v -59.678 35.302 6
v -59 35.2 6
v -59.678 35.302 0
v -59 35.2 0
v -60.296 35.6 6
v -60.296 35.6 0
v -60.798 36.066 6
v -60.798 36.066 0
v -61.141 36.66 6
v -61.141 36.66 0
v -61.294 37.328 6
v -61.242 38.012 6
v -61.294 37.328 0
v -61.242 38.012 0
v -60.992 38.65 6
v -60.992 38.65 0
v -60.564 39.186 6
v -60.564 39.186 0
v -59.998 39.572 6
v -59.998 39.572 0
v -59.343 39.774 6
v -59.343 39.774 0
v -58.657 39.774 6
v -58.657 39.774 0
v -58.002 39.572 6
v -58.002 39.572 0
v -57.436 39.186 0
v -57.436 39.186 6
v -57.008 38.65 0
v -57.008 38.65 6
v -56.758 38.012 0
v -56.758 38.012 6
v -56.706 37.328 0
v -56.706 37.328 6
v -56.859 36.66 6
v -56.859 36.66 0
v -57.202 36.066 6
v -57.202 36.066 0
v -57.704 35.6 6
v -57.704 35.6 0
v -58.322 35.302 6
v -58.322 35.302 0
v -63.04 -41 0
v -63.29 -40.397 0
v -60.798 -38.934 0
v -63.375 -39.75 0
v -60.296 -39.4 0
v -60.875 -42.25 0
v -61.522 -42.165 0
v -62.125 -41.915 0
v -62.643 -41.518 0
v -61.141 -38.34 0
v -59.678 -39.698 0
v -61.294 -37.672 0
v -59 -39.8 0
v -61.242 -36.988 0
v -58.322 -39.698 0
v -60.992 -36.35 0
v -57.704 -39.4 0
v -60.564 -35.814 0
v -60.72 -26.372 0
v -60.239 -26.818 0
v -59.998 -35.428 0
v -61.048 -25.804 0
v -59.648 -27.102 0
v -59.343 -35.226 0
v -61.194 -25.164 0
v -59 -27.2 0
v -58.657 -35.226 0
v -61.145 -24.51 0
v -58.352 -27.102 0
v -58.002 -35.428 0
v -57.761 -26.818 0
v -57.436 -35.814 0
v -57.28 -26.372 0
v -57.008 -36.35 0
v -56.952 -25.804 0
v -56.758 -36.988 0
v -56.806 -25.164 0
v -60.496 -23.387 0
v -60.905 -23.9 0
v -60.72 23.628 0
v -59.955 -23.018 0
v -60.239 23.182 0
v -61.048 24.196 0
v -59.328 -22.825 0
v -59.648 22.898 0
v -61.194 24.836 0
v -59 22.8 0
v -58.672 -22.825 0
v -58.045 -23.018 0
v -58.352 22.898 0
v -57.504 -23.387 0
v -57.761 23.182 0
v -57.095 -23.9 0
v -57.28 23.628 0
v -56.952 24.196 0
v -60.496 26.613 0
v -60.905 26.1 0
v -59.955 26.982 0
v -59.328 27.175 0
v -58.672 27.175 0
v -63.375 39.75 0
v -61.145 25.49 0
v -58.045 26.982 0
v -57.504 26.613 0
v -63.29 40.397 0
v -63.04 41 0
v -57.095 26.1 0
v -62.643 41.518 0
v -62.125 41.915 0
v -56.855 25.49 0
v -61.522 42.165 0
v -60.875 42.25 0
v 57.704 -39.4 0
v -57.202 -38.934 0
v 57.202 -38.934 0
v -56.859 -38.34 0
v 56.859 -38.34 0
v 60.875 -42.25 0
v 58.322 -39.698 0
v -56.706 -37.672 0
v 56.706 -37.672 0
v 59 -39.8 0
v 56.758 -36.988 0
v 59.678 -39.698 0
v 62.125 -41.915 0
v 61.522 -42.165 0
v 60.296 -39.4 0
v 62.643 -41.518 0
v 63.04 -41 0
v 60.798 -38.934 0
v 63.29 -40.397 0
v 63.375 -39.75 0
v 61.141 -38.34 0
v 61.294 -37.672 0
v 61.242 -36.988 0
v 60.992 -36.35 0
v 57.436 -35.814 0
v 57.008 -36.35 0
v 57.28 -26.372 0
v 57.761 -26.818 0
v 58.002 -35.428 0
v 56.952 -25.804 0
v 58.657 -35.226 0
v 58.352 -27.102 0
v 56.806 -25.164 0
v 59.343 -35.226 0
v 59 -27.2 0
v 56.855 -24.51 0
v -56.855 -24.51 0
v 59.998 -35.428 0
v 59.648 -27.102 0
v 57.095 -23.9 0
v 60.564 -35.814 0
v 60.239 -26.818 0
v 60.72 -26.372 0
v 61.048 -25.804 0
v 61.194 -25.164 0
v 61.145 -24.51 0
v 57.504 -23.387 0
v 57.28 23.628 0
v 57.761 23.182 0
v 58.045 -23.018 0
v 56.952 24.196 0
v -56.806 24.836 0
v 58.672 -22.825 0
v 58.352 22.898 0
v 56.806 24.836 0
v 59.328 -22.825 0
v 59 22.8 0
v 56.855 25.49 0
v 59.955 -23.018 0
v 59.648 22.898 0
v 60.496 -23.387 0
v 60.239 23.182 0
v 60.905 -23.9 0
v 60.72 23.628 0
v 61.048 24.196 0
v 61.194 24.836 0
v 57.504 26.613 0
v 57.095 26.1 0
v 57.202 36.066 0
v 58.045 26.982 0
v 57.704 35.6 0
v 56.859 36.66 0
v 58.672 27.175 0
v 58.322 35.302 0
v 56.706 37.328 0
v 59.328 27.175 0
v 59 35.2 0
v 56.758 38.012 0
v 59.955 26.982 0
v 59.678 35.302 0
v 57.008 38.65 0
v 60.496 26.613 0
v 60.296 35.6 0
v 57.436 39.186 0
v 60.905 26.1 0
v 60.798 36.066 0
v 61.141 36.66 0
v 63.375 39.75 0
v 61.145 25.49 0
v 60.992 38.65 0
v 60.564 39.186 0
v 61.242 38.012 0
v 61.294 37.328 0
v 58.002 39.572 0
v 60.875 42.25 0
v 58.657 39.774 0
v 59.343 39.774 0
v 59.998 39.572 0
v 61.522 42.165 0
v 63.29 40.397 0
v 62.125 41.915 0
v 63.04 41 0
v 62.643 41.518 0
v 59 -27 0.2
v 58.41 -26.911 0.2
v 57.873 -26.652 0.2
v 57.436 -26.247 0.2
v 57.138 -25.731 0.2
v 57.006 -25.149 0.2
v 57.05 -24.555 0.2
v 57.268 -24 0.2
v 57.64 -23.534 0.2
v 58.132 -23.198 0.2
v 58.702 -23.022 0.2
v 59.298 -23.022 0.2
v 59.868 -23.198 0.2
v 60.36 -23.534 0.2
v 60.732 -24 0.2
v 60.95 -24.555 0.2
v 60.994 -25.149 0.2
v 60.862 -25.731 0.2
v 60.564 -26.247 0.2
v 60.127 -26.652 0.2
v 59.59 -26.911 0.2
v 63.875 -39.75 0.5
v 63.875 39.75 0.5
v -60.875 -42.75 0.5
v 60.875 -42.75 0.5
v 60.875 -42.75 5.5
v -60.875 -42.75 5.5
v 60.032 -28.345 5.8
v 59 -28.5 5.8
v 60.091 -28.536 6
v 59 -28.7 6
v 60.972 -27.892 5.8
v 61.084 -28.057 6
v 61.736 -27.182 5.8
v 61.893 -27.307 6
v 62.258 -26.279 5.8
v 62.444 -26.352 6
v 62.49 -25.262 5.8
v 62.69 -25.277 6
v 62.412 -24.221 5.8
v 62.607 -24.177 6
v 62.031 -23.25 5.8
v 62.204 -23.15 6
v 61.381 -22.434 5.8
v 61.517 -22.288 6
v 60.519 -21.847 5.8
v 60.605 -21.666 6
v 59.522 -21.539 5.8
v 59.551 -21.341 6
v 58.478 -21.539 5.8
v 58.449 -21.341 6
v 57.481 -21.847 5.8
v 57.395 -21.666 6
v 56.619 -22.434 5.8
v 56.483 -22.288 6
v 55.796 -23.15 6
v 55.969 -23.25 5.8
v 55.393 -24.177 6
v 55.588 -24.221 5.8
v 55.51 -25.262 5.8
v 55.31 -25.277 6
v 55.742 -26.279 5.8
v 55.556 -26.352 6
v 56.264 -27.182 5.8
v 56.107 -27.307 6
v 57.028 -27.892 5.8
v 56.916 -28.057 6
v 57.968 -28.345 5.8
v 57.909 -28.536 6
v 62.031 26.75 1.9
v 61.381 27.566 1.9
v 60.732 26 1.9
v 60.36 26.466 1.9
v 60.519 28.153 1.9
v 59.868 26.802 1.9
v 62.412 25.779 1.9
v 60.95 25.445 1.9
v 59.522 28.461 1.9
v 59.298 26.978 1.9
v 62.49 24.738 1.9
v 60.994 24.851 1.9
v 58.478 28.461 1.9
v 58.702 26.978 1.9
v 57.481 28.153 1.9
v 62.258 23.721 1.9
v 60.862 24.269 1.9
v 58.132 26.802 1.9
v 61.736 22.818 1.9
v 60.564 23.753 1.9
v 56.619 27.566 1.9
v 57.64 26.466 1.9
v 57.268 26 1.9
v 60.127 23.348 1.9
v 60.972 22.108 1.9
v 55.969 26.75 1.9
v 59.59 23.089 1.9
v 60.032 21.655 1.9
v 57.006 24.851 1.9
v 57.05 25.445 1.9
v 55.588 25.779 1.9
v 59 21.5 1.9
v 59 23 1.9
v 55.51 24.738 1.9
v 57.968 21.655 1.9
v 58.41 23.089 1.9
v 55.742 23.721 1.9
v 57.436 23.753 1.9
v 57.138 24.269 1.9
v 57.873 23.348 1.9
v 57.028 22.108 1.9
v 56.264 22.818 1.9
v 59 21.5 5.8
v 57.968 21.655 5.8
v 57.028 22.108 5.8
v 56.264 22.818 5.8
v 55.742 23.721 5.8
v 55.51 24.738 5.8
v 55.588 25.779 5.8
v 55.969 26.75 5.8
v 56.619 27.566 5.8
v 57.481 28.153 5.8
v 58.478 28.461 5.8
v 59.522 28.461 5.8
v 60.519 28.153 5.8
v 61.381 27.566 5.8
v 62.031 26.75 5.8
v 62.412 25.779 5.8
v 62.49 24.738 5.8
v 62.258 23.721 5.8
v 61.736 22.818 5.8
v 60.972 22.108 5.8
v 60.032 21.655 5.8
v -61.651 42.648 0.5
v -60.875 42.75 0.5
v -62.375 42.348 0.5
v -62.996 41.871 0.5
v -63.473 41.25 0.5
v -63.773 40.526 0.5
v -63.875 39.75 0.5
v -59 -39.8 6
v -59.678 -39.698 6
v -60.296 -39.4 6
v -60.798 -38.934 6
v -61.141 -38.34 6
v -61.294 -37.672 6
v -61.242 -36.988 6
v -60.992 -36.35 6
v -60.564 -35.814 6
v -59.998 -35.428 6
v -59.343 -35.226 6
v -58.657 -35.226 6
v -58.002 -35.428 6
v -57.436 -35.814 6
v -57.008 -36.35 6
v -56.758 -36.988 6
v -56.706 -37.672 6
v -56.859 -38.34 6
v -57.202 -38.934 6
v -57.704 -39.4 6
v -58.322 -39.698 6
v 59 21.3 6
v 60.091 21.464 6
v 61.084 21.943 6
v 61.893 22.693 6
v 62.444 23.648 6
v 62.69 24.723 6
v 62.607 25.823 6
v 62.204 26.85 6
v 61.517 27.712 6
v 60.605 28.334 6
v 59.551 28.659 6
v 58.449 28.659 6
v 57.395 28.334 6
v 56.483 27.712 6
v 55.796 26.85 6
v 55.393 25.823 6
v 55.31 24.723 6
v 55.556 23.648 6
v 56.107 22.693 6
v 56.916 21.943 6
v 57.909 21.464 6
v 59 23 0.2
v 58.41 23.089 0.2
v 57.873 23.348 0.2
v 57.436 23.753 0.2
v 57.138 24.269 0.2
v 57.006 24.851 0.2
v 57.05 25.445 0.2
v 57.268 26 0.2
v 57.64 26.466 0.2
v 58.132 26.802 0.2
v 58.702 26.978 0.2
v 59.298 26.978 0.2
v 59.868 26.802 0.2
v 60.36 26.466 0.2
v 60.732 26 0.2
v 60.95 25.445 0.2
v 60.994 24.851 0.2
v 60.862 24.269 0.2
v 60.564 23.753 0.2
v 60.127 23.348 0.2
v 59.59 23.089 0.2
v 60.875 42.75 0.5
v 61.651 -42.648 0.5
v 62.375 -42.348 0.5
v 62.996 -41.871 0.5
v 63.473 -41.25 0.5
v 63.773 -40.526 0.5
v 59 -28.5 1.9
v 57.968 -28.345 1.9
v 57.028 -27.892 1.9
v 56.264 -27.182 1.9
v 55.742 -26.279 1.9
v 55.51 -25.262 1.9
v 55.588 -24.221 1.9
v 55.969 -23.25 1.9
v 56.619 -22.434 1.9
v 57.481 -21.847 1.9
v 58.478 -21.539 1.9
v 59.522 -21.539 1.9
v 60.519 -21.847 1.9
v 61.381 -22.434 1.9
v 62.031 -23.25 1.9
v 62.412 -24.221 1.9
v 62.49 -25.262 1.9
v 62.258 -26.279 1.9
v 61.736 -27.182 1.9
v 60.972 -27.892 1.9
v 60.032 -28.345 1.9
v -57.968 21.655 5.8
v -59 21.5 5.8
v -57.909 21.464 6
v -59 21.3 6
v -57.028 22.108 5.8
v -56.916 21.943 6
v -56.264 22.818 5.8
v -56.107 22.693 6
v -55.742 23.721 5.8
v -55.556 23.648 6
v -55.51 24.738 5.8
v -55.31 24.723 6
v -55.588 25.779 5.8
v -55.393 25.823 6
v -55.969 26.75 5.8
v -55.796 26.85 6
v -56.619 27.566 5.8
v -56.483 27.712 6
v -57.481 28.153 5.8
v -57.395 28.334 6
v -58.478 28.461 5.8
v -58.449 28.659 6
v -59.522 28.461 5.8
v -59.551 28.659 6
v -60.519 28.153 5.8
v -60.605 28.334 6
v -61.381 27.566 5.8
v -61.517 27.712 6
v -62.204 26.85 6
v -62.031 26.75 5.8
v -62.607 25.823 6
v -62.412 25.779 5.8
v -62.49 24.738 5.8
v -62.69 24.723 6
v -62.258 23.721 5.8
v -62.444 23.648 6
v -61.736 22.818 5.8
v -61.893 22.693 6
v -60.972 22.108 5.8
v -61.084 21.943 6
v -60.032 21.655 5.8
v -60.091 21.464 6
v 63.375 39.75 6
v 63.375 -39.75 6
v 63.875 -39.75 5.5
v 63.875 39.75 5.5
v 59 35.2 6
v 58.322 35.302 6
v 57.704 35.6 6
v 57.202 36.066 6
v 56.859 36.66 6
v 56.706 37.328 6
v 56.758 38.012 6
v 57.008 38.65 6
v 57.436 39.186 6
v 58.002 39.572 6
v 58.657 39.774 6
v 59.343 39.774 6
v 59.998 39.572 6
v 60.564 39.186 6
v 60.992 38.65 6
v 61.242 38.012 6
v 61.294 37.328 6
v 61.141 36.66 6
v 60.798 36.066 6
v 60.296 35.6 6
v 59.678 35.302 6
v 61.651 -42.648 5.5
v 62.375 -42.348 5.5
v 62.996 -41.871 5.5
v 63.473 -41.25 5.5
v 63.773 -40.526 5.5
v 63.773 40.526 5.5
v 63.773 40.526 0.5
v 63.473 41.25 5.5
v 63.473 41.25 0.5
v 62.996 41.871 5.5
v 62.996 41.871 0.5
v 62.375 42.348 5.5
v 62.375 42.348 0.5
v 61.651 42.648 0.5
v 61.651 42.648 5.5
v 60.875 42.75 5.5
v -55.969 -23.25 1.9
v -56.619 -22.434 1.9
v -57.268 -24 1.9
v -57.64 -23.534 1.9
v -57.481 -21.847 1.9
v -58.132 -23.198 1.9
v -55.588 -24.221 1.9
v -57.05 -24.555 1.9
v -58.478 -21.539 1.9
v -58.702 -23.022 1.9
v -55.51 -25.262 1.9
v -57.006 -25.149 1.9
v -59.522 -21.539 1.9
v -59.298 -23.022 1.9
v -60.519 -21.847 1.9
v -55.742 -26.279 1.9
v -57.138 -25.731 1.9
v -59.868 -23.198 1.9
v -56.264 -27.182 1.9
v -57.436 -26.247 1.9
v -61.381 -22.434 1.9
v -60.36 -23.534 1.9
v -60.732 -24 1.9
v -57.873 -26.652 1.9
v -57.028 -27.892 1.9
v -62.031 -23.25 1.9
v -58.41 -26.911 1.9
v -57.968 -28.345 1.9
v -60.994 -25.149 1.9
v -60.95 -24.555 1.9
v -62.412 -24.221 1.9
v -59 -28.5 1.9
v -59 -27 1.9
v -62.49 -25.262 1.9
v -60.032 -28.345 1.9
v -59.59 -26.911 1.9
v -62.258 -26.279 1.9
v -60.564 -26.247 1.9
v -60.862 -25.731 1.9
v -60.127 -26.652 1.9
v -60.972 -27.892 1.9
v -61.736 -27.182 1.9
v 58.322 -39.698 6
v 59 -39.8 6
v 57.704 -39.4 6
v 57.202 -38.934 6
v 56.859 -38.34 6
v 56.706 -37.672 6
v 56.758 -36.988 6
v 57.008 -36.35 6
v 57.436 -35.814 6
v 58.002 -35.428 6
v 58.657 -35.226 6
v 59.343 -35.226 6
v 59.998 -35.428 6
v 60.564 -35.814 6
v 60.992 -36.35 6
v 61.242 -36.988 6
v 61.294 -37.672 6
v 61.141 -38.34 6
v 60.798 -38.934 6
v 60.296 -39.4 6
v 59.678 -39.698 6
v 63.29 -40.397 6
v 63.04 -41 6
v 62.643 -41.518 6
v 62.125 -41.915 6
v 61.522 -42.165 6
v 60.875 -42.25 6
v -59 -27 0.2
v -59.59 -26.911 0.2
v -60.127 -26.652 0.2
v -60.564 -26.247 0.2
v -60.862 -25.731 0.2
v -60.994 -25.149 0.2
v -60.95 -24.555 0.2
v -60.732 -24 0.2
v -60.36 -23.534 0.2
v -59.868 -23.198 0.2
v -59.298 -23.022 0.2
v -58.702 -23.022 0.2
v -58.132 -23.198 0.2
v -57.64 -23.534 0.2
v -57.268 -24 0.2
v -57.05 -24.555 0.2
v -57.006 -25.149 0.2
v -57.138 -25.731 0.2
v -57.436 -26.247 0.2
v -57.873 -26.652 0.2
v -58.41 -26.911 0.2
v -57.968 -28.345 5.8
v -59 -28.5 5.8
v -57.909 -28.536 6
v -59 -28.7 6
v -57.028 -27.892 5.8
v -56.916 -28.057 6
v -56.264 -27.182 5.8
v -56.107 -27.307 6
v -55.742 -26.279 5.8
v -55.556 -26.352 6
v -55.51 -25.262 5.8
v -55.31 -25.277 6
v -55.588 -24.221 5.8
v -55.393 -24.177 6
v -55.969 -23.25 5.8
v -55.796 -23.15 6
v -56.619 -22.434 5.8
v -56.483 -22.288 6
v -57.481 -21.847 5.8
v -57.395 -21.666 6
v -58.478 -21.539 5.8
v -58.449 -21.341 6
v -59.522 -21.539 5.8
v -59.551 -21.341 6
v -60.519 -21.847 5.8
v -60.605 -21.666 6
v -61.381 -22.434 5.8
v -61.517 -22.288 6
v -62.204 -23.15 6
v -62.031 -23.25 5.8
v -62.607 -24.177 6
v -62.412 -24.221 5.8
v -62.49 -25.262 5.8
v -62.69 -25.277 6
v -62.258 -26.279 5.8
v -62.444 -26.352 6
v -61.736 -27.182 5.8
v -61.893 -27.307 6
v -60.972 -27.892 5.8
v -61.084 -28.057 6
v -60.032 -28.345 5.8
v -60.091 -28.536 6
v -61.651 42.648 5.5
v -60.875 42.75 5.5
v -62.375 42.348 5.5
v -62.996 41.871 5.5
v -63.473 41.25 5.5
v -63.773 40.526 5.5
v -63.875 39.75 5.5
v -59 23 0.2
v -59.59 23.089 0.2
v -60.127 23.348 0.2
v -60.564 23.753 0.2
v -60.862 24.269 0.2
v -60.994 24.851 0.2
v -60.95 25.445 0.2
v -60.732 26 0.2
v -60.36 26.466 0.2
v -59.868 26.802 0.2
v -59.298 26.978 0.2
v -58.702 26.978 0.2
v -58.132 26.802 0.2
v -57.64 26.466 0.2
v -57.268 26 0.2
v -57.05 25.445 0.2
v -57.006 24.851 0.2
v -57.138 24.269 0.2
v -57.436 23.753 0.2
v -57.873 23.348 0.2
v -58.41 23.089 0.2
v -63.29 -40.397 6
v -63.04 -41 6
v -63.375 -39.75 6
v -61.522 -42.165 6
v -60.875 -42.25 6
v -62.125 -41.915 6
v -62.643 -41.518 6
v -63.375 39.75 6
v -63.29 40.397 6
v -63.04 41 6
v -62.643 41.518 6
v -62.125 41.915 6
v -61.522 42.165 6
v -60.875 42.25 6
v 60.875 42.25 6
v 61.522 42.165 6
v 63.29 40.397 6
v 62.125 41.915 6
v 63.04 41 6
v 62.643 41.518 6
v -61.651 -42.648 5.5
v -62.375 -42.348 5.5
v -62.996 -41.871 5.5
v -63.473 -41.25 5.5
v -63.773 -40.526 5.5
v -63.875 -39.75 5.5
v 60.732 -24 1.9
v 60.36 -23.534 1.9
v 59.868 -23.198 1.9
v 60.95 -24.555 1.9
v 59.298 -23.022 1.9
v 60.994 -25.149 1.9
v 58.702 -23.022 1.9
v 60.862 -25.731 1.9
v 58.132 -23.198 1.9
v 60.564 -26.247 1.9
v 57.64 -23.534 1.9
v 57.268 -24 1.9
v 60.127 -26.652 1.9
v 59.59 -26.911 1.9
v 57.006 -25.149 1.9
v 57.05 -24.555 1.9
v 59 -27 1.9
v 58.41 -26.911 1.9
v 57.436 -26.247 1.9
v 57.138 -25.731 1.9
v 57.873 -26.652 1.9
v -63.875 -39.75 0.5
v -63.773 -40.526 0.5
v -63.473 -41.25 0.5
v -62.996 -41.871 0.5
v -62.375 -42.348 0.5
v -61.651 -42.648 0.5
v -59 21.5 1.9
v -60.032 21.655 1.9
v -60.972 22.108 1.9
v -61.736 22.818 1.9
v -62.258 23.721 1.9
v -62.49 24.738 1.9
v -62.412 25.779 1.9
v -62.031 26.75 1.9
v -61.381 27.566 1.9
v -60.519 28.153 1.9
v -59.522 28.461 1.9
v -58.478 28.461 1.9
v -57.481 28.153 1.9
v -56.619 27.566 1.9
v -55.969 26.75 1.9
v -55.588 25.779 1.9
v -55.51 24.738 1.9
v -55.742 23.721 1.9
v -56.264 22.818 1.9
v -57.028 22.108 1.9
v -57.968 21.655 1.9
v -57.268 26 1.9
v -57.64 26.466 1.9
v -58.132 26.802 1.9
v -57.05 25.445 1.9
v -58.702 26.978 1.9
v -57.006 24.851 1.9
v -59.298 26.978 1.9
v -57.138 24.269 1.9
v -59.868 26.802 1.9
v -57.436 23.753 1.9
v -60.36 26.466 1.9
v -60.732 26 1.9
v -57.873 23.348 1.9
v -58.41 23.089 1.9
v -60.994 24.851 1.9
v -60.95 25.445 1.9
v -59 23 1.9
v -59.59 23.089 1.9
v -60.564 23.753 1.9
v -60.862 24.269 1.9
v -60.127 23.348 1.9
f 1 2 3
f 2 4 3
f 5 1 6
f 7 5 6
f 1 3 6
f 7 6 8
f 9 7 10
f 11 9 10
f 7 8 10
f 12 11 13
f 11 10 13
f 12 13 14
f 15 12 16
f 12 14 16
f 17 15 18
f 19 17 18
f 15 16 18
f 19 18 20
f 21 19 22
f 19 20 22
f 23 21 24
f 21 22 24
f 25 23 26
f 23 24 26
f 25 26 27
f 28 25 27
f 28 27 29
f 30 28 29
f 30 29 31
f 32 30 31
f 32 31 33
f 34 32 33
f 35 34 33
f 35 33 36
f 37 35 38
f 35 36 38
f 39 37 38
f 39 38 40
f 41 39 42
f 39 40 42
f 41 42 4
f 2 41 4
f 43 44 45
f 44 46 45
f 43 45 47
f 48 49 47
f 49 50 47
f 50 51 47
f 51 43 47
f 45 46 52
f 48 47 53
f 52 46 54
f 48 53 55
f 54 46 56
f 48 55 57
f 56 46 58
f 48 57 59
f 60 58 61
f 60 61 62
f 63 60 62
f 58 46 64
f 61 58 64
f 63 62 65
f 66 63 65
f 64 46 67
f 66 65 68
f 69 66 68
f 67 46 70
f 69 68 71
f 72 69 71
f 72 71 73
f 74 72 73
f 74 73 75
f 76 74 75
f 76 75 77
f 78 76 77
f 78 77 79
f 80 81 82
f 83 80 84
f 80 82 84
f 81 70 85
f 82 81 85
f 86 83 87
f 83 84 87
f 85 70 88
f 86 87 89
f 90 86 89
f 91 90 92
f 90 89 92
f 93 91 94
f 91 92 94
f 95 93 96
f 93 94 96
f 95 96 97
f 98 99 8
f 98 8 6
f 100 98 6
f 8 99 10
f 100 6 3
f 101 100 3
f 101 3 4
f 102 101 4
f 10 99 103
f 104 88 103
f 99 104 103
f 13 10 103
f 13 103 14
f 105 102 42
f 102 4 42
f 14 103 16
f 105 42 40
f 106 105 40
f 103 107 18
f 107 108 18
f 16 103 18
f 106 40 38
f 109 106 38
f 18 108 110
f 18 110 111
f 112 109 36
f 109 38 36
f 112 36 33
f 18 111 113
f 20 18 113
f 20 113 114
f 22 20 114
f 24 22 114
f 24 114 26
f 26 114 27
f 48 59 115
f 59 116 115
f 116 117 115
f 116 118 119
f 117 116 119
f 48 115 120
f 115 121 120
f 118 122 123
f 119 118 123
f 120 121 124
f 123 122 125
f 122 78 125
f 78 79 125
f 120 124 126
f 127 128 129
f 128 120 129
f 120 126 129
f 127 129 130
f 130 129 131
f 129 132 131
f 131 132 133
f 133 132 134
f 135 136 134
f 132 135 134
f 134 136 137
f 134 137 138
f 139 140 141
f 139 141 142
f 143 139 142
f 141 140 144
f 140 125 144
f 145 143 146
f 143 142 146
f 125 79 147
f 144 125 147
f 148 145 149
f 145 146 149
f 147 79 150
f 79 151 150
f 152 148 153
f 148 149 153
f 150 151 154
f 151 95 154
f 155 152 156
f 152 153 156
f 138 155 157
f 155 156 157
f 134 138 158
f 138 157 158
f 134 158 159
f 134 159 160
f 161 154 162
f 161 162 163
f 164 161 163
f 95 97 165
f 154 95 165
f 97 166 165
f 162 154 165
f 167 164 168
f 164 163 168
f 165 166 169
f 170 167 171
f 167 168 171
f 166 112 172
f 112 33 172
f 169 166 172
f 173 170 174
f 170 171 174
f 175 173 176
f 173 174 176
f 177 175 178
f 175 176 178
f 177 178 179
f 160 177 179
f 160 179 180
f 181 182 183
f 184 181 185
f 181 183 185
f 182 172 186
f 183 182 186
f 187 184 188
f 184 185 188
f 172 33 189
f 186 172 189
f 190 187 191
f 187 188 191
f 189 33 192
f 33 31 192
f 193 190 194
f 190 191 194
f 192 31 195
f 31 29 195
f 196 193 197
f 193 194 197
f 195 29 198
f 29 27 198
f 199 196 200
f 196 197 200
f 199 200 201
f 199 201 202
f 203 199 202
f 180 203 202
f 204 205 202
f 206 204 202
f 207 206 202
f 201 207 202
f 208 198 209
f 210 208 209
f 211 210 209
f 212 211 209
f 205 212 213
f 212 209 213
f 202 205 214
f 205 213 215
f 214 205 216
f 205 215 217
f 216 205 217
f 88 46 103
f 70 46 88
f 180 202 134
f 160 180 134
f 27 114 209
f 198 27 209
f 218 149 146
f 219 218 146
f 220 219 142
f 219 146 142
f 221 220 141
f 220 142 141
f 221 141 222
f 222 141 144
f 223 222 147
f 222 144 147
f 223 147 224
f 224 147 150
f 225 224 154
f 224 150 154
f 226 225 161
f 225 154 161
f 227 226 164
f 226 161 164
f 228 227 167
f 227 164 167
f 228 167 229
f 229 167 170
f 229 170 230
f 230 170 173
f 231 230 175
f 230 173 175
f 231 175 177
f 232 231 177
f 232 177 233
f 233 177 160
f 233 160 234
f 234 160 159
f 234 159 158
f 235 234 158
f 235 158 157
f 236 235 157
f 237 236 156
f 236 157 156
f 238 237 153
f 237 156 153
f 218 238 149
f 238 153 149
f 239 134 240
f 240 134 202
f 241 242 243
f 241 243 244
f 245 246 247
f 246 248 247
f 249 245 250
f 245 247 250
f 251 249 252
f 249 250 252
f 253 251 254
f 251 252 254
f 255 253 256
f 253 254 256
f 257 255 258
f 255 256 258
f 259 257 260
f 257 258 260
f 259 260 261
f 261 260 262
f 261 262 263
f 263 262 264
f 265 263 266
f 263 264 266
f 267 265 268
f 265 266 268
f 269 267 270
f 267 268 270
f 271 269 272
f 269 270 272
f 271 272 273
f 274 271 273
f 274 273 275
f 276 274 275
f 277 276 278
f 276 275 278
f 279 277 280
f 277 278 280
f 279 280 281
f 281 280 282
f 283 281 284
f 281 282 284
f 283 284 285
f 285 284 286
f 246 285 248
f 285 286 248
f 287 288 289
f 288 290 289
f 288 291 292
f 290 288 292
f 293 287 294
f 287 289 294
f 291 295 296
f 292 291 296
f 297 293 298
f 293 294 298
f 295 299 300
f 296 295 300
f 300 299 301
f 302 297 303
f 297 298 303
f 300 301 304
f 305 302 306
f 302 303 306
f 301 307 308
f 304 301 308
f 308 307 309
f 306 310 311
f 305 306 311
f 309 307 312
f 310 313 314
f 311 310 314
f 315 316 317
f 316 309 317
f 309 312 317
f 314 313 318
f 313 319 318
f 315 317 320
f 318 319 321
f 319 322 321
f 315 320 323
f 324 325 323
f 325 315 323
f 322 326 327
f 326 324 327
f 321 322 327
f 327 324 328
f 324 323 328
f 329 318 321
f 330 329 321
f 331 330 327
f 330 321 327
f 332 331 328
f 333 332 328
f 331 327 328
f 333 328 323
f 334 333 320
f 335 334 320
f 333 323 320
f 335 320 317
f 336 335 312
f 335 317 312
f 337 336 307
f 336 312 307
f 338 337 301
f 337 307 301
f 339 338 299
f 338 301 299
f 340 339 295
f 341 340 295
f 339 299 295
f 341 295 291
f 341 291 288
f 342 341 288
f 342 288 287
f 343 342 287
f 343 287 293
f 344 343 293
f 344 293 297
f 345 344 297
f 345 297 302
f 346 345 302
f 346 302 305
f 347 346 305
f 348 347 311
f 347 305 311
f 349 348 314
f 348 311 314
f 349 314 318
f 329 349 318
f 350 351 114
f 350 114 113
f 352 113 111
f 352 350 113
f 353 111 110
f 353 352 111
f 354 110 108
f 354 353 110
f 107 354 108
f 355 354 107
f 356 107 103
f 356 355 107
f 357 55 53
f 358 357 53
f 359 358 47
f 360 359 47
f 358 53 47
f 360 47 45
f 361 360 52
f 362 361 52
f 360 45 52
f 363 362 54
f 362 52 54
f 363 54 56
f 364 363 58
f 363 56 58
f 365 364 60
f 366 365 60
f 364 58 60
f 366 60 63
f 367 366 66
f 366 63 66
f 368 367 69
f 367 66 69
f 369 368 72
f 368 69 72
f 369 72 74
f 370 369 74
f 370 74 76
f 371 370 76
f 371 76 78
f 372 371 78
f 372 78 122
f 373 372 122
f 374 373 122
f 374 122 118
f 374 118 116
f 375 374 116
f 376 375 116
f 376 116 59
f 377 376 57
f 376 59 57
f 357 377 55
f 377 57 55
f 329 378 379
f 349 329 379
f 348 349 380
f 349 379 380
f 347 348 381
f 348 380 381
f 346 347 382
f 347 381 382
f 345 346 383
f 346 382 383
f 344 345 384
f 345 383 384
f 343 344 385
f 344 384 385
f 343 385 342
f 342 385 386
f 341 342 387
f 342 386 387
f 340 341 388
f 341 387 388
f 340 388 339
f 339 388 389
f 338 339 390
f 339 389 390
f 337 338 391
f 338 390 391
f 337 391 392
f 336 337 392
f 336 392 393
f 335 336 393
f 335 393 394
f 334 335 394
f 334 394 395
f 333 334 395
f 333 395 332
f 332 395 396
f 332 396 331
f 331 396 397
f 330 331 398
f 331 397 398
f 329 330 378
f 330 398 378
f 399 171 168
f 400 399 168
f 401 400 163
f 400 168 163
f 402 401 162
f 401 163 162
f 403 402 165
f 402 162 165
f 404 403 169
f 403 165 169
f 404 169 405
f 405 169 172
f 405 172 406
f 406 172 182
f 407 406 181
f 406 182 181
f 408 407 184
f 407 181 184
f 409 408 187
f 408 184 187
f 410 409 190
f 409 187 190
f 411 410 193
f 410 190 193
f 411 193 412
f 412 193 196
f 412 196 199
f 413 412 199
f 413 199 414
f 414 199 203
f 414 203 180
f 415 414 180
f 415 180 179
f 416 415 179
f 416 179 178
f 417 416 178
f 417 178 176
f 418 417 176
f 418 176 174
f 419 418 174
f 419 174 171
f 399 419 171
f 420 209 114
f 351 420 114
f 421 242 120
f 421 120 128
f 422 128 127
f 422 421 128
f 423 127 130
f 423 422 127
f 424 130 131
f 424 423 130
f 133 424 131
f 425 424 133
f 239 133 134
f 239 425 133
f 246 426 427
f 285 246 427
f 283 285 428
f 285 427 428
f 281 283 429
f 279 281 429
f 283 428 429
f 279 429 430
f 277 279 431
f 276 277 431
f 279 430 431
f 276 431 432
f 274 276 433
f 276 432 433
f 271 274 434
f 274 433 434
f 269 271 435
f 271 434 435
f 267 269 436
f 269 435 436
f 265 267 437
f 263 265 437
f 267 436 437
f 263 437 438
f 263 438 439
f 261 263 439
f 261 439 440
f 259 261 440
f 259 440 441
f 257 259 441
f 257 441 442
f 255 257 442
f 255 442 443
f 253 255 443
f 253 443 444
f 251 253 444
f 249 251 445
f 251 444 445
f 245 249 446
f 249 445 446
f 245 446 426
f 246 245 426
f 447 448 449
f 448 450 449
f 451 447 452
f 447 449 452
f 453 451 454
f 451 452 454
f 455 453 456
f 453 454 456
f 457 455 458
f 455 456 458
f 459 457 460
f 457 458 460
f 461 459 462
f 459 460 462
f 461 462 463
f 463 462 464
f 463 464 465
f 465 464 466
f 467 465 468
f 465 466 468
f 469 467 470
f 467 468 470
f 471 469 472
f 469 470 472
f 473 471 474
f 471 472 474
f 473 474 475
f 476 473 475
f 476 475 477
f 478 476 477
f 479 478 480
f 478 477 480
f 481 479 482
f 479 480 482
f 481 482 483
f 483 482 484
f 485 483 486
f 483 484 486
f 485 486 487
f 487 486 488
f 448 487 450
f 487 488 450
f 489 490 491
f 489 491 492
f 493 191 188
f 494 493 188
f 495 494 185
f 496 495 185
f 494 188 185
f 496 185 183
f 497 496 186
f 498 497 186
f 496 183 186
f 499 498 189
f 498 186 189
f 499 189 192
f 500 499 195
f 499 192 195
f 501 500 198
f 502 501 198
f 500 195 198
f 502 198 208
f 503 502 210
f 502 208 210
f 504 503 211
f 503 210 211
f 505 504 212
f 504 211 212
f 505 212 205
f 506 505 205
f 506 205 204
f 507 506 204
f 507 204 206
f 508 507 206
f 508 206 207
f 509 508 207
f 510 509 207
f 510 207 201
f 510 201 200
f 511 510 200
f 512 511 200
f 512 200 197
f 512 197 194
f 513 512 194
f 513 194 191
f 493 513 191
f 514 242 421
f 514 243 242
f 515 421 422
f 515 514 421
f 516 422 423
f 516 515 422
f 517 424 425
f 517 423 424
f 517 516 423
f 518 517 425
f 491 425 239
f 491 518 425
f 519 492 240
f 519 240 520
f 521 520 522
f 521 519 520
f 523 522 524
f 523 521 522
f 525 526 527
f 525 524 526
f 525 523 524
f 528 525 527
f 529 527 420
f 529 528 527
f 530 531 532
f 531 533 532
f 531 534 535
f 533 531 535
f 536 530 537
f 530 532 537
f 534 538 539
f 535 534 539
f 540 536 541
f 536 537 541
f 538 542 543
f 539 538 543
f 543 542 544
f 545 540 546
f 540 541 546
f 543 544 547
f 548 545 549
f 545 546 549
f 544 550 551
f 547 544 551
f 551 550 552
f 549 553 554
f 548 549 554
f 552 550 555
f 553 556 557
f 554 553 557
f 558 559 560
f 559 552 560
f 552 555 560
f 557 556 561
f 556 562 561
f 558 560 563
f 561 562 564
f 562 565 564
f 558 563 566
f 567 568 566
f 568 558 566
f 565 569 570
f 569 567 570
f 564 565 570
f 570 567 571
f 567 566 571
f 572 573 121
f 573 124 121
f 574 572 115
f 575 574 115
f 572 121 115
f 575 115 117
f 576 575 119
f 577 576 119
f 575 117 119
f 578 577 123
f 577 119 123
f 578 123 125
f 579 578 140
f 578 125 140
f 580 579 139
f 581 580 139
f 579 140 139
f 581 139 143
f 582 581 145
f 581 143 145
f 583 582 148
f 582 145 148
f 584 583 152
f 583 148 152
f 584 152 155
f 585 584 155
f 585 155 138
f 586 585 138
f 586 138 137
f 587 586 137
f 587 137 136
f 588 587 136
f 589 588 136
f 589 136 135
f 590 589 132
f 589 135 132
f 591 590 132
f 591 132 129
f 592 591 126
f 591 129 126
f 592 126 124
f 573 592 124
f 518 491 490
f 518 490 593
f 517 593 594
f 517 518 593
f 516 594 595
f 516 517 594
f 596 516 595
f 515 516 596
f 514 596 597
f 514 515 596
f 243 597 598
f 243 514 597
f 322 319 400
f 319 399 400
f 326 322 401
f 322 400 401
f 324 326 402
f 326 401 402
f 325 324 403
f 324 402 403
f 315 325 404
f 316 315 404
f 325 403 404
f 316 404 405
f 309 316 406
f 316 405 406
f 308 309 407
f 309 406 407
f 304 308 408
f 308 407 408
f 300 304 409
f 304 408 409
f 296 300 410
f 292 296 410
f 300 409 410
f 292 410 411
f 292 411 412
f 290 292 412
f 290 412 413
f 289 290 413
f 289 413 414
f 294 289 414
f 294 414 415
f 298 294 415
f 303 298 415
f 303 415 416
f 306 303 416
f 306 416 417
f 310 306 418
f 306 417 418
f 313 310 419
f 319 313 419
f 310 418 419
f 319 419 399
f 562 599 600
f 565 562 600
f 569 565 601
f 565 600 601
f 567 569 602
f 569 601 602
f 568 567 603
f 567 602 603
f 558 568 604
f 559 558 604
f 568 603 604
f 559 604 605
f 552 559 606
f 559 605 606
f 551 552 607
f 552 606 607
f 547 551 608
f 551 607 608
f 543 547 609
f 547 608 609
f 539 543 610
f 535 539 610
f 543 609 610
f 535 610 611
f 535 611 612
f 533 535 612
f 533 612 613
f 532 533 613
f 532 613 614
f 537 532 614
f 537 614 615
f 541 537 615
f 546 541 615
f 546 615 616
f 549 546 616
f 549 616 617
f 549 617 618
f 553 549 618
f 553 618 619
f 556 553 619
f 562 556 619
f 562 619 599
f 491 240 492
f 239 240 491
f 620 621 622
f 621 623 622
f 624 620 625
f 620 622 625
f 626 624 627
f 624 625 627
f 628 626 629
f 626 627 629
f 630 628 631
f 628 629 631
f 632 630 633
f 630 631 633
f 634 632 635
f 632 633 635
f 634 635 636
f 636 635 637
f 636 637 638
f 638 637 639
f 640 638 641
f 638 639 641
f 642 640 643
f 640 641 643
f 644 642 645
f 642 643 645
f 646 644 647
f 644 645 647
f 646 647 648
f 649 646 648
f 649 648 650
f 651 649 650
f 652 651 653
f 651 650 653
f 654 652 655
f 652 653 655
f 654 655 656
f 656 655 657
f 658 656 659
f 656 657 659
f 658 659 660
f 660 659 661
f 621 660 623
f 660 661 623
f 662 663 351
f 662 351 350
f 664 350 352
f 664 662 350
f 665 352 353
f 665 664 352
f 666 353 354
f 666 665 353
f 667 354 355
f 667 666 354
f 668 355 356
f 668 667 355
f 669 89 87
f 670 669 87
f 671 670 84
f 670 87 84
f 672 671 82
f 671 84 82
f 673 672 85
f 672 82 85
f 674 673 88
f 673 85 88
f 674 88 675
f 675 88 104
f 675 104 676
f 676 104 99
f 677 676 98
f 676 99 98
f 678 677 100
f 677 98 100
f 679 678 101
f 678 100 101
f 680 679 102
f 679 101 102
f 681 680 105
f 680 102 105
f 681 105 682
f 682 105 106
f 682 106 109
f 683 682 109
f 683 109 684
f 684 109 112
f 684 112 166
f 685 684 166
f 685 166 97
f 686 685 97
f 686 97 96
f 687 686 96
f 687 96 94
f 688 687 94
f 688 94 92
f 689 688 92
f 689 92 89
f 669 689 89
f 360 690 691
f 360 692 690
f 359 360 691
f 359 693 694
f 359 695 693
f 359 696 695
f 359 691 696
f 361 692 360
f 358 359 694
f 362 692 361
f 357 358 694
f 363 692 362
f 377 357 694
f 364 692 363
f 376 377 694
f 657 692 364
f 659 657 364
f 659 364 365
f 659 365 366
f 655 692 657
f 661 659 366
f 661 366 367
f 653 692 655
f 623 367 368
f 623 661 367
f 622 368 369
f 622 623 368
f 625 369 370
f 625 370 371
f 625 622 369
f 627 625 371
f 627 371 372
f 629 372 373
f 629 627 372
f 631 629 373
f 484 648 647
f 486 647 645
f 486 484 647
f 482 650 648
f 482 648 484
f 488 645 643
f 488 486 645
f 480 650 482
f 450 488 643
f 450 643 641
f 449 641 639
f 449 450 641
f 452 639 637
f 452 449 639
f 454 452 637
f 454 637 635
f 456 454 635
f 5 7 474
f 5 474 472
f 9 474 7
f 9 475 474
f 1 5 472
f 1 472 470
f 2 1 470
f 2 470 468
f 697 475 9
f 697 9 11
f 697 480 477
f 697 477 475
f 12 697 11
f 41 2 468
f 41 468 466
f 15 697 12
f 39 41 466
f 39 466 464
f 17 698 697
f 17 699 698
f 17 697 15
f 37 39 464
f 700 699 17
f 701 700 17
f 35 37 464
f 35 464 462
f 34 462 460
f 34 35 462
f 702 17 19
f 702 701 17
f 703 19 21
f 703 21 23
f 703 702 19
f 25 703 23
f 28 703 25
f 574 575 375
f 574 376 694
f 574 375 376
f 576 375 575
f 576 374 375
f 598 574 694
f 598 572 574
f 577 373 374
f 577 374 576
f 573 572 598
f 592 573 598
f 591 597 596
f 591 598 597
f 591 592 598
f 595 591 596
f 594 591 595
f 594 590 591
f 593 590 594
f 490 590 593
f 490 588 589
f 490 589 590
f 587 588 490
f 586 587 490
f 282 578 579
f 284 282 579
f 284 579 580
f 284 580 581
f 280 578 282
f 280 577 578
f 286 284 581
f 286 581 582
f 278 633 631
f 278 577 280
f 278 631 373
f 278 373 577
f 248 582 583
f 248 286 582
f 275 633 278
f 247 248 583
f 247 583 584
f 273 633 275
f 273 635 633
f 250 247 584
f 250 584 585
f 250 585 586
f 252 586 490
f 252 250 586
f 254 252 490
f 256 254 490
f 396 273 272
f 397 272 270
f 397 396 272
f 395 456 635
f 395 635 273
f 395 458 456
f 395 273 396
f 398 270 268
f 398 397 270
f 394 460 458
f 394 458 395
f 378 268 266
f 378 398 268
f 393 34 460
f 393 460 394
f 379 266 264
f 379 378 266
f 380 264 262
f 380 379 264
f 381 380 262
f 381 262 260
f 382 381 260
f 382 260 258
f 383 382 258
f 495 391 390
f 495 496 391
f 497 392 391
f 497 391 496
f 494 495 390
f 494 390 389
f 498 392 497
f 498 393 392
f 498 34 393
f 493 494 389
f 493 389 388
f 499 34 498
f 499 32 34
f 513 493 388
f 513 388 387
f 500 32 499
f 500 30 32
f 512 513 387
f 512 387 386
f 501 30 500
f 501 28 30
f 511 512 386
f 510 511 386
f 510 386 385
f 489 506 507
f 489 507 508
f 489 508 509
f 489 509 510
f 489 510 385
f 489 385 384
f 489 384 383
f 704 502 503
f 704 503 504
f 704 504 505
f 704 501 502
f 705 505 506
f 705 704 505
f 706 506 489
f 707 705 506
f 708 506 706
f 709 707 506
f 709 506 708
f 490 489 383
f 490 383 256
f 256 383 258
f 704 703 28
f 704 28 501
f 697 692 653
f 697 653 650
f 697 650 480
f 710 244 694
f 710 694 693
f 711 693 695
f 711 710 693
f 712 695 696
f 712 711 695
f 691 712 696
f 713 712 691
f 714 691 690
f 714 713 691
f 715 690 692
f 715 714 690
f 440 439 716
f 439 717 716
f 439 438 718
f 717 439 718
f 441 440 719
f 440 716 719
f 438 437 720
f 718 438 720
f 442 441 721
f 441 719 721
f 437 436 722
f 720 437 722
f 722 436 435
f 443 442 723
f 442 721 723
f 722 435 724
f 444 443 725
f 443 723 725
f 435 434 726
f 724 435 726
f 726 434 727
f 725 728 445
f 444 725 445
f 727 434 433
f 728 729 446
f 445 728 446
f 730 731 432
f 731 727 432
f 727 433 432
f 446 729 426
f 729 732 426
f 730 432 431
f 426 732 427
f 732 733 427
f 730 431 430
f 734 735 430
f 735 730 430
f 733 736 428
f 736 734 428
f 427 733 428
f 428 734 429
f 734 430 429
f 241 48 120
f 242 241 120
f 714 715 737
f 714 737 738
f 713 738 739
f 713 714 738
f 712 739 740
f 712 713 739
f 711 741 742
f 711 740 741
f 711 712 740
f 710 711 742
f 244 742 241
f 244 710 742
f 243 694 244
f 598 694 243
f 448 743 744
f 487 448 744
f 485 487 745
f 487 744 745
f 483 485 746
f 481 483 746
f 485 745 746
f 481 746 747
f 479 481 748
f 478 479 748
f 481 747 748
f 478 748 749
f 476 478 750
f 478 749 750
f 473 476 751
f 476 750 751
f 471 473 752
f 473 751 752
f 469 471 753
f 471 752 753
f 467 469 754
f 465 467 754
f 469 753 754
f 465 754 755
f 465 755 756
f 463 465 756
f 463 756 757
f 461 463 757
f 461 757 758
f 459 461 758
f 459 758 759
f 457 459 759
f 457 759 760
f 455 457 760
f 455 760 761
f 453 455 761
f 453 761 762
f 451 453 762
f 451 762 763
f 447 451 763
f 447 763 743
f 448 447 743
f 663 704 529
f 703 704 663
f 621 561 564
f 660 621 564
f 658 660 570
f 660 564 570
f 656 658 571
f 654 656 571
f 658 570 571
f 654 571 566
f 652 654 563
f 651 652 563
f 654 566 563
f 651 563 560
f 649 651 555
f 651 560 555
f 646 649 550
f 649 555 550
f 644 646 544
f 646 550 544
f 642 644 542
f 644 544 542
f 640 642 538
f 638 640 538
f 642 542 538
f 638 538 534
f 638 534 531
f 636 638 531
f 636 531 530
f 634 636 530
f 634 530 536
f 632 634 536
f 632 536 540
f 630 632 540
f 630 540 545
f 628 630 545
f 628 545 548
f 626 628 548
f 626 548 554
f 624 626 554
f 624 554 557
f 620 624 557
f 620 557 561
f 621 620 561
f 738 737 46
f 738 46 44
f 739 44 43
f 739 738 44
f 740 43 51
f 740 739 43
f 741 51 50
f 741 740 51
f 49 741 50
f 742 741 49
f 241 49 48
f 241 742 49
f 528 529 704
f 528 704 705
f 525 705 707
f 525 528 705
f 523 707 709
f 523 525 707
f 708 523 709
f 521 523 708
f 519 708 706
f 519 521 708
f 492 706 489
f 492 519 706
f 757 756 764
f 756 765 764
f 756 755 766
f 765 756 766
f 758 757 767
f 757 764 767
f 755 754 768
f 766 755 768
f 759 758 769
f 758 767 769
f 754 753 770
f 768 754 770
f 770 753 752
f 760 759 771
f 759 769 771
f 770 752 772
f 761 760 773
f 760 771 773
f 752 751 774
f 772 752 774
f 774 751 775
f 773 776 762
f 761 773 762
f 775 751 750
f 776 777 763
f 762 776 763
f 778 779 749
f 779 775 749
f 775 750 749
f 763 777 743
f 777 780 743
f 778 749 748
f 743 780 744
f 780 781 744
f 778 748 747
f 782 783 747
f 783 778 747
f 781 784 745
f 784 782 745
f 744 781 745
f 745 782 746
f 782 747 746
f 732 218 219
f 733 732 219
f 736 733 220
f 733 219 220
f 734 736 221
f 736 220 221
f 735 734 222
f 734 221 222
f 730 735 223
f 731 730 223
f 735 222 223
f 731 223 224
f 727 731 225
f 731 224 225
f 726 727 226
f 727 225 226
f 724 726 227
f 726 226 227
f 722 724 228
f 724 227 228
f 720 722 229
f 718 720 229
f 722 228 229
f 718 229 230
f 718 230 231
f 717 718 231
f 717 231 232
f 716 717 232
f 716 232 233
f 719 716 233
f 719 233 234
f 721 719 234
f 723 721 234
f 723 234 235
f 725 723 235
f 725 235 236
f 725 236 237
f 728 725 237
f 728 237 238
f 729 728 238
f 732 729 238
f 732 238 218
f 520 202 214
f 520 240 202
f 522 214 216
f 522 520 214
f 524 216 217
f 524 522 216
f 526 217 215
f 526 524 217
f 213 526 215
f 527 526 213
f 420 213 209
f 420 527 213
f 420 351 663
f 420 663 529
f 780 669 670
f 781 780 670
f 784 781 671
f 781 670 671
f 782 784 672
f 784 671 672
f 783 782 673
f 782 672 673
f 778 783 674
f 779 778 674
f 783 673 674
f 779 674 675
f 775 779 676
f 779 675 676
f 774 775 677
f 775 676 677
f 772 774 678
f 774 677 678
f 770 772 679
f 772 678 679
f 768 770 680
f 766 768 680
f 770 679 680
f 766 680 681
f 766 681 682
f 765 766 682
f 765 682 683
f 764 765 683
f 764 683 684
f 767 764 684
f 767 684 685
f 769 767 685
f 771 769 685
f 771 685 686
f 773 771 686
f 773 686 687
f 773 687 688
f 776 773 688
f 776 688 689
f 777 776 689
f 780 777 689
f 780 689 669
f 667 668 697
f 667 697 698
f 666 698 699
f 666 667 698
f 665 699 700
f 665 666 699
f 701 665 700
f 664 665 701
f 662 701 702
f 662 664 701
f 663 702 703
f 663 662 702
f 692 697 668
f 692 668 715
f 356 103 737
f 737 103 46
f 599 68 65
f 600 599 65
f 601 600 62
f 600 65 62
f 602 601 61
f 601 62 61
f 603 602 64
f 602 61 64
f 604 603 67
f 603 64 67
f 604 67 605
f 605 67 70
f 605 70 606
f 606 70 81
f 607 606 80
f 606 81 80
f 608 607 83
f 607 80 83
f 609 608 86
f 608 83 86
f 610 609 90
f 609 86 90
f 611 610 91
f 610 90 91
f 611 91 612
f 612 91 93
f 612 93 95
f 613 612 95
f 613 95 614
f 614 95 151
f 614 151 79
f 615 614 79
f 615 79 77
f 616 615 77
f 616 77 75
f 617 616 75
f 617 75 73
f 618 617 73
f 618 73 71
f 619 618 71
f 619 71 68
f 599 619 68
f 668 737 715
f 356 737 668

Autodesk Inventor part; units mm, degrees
ref_plane "YZ Plane" through (0, 0, 0) normal (1, 0, 0) x (0, 1, 0)
ref_plane "XZ Plane" through (0, 0, 0) normal (0, 1, 0) x (-1, 0, 0)
ref_plane "XY Plane" through (0, 0, 0) normal (0, 0, 1) x (1, 0, 0)
sketch "Sketch1" plane through (0, 0, 0) normal (0, 0, 1) x (1, 0, 0)
  line L0 (-63.875, 42.75) -> (63.875, 42.75)
  line L1 (63.875, 42.75) -> (63.875, -42.75)
  line L2 (63.875, -42.75) -> (-63.875, -42.75)
  line L3 (-63.875, -42.75) -> (-63.875, 42.75)
  line L4 (-63.875, 42.75) -> (63.875, -42.75) construction
  line L5 (63.875, 42.75) -> (-63.875, -42.75) construction
  point P0 (0, 0)
  dimension "d0" = 85.5
  dimension "d1" = 127.75
extrude "Extrusion1" add sketch "Sketch1" along normal blind 6
sketch "Sketch2" plane through (0, 0, 6) normal (0, 0, 1) x (1, 0, 0)
  point P0 (0, 0)
  point P1 (-59, 25)
  point P2 (-59, -25)
  point P3 (59, -25)
  point P4 (59, 25)
  dimension "d4" = 59
  dimension "d5" = 25
  dimension "d6" = 25
  dimension "d7" = 59
fillet "Fillet1" radius 3 4 edges at (-63.875, 42.75, 3) (-63.875, -42.75, 3) (63.875, -42.75, 3) (63.875, 42.75, 3)
hole "Hole1" at (-59, 25, 6) at (-59, -25, 6) at (59, -25, 6) at (59, 25, 6) direction (0, 0, -1) diameter 4 end through all counterbore diameter 7 counterbore depth 4.1
chamfer "Chamfer1" distance 0.5 angle 45 16 edges at (0, 42.75, 0) (-62.9963, 41.8713, 0) (-63.875, 0, 0) (-62.9963, -41.8713, 0) (0, -42.75, 0) (62.9963, -41.8713, 0) (63.875, 0, 0) (62.9963, 41.8713, 0) (0, 42.75, 6) (-62.9963, 41.8713, 6) (-63.875, 0, 6) (-62.9963, -41.8713, 6) (0, -42.75, 6) (62.9963, -41.8713, 6) (63.875, 0, 6) (62.9963, 41.8713, 6)
chamfer "Chamfer2" distance 0.2 angle 45 8 edges at (-59, -21.5, 6) (59, -21.5, 6) (-59, 28.5, 6) (59, 28.5, 6) (-59, -23, 0) (59, -23, 0) (-59, 27, 0) (59, 27, 0)
sketch "Sketch3" plane through (0, 0, 6) normal (0, 0, 1) x (1, 0, 0)
  arc A0 (-60.875, 42.75) -> (-63.875, 39.75) centre (-60.875, 39.75) ccw projected
  arc A1 (63.875, 39.75) -> (60.875, 42.75) centre (60.875, 39.75) ccw projected
  arc A2 (60.875, -42.75) -> (63.875, -39.75) centre (60.875, -39.75) ccw projected
  arc A3 (-63.875, -39.75) -> (-60.875, -42.75) centre (-60.875, -39.75) ccw projected
  point P0 (0, 0)
  point P1 (-59, -37.5)
  point P2 (-59, 37.5)
  point P3 (59, 37.5)
  point P4 (59, -37.5)
  dimension "d29" = 37.5
  dimension "d30" = 37.5
hole "Hole2" at (-59, 37.5, 6) at (59, -37.5, 6) at (59, 37.5, 6) at (-59, -37.5, 6) direction (0, 0, -1) diameter 4.6 end through all
properties part number "Conecting plate 1" material "Aluminum 6061"
